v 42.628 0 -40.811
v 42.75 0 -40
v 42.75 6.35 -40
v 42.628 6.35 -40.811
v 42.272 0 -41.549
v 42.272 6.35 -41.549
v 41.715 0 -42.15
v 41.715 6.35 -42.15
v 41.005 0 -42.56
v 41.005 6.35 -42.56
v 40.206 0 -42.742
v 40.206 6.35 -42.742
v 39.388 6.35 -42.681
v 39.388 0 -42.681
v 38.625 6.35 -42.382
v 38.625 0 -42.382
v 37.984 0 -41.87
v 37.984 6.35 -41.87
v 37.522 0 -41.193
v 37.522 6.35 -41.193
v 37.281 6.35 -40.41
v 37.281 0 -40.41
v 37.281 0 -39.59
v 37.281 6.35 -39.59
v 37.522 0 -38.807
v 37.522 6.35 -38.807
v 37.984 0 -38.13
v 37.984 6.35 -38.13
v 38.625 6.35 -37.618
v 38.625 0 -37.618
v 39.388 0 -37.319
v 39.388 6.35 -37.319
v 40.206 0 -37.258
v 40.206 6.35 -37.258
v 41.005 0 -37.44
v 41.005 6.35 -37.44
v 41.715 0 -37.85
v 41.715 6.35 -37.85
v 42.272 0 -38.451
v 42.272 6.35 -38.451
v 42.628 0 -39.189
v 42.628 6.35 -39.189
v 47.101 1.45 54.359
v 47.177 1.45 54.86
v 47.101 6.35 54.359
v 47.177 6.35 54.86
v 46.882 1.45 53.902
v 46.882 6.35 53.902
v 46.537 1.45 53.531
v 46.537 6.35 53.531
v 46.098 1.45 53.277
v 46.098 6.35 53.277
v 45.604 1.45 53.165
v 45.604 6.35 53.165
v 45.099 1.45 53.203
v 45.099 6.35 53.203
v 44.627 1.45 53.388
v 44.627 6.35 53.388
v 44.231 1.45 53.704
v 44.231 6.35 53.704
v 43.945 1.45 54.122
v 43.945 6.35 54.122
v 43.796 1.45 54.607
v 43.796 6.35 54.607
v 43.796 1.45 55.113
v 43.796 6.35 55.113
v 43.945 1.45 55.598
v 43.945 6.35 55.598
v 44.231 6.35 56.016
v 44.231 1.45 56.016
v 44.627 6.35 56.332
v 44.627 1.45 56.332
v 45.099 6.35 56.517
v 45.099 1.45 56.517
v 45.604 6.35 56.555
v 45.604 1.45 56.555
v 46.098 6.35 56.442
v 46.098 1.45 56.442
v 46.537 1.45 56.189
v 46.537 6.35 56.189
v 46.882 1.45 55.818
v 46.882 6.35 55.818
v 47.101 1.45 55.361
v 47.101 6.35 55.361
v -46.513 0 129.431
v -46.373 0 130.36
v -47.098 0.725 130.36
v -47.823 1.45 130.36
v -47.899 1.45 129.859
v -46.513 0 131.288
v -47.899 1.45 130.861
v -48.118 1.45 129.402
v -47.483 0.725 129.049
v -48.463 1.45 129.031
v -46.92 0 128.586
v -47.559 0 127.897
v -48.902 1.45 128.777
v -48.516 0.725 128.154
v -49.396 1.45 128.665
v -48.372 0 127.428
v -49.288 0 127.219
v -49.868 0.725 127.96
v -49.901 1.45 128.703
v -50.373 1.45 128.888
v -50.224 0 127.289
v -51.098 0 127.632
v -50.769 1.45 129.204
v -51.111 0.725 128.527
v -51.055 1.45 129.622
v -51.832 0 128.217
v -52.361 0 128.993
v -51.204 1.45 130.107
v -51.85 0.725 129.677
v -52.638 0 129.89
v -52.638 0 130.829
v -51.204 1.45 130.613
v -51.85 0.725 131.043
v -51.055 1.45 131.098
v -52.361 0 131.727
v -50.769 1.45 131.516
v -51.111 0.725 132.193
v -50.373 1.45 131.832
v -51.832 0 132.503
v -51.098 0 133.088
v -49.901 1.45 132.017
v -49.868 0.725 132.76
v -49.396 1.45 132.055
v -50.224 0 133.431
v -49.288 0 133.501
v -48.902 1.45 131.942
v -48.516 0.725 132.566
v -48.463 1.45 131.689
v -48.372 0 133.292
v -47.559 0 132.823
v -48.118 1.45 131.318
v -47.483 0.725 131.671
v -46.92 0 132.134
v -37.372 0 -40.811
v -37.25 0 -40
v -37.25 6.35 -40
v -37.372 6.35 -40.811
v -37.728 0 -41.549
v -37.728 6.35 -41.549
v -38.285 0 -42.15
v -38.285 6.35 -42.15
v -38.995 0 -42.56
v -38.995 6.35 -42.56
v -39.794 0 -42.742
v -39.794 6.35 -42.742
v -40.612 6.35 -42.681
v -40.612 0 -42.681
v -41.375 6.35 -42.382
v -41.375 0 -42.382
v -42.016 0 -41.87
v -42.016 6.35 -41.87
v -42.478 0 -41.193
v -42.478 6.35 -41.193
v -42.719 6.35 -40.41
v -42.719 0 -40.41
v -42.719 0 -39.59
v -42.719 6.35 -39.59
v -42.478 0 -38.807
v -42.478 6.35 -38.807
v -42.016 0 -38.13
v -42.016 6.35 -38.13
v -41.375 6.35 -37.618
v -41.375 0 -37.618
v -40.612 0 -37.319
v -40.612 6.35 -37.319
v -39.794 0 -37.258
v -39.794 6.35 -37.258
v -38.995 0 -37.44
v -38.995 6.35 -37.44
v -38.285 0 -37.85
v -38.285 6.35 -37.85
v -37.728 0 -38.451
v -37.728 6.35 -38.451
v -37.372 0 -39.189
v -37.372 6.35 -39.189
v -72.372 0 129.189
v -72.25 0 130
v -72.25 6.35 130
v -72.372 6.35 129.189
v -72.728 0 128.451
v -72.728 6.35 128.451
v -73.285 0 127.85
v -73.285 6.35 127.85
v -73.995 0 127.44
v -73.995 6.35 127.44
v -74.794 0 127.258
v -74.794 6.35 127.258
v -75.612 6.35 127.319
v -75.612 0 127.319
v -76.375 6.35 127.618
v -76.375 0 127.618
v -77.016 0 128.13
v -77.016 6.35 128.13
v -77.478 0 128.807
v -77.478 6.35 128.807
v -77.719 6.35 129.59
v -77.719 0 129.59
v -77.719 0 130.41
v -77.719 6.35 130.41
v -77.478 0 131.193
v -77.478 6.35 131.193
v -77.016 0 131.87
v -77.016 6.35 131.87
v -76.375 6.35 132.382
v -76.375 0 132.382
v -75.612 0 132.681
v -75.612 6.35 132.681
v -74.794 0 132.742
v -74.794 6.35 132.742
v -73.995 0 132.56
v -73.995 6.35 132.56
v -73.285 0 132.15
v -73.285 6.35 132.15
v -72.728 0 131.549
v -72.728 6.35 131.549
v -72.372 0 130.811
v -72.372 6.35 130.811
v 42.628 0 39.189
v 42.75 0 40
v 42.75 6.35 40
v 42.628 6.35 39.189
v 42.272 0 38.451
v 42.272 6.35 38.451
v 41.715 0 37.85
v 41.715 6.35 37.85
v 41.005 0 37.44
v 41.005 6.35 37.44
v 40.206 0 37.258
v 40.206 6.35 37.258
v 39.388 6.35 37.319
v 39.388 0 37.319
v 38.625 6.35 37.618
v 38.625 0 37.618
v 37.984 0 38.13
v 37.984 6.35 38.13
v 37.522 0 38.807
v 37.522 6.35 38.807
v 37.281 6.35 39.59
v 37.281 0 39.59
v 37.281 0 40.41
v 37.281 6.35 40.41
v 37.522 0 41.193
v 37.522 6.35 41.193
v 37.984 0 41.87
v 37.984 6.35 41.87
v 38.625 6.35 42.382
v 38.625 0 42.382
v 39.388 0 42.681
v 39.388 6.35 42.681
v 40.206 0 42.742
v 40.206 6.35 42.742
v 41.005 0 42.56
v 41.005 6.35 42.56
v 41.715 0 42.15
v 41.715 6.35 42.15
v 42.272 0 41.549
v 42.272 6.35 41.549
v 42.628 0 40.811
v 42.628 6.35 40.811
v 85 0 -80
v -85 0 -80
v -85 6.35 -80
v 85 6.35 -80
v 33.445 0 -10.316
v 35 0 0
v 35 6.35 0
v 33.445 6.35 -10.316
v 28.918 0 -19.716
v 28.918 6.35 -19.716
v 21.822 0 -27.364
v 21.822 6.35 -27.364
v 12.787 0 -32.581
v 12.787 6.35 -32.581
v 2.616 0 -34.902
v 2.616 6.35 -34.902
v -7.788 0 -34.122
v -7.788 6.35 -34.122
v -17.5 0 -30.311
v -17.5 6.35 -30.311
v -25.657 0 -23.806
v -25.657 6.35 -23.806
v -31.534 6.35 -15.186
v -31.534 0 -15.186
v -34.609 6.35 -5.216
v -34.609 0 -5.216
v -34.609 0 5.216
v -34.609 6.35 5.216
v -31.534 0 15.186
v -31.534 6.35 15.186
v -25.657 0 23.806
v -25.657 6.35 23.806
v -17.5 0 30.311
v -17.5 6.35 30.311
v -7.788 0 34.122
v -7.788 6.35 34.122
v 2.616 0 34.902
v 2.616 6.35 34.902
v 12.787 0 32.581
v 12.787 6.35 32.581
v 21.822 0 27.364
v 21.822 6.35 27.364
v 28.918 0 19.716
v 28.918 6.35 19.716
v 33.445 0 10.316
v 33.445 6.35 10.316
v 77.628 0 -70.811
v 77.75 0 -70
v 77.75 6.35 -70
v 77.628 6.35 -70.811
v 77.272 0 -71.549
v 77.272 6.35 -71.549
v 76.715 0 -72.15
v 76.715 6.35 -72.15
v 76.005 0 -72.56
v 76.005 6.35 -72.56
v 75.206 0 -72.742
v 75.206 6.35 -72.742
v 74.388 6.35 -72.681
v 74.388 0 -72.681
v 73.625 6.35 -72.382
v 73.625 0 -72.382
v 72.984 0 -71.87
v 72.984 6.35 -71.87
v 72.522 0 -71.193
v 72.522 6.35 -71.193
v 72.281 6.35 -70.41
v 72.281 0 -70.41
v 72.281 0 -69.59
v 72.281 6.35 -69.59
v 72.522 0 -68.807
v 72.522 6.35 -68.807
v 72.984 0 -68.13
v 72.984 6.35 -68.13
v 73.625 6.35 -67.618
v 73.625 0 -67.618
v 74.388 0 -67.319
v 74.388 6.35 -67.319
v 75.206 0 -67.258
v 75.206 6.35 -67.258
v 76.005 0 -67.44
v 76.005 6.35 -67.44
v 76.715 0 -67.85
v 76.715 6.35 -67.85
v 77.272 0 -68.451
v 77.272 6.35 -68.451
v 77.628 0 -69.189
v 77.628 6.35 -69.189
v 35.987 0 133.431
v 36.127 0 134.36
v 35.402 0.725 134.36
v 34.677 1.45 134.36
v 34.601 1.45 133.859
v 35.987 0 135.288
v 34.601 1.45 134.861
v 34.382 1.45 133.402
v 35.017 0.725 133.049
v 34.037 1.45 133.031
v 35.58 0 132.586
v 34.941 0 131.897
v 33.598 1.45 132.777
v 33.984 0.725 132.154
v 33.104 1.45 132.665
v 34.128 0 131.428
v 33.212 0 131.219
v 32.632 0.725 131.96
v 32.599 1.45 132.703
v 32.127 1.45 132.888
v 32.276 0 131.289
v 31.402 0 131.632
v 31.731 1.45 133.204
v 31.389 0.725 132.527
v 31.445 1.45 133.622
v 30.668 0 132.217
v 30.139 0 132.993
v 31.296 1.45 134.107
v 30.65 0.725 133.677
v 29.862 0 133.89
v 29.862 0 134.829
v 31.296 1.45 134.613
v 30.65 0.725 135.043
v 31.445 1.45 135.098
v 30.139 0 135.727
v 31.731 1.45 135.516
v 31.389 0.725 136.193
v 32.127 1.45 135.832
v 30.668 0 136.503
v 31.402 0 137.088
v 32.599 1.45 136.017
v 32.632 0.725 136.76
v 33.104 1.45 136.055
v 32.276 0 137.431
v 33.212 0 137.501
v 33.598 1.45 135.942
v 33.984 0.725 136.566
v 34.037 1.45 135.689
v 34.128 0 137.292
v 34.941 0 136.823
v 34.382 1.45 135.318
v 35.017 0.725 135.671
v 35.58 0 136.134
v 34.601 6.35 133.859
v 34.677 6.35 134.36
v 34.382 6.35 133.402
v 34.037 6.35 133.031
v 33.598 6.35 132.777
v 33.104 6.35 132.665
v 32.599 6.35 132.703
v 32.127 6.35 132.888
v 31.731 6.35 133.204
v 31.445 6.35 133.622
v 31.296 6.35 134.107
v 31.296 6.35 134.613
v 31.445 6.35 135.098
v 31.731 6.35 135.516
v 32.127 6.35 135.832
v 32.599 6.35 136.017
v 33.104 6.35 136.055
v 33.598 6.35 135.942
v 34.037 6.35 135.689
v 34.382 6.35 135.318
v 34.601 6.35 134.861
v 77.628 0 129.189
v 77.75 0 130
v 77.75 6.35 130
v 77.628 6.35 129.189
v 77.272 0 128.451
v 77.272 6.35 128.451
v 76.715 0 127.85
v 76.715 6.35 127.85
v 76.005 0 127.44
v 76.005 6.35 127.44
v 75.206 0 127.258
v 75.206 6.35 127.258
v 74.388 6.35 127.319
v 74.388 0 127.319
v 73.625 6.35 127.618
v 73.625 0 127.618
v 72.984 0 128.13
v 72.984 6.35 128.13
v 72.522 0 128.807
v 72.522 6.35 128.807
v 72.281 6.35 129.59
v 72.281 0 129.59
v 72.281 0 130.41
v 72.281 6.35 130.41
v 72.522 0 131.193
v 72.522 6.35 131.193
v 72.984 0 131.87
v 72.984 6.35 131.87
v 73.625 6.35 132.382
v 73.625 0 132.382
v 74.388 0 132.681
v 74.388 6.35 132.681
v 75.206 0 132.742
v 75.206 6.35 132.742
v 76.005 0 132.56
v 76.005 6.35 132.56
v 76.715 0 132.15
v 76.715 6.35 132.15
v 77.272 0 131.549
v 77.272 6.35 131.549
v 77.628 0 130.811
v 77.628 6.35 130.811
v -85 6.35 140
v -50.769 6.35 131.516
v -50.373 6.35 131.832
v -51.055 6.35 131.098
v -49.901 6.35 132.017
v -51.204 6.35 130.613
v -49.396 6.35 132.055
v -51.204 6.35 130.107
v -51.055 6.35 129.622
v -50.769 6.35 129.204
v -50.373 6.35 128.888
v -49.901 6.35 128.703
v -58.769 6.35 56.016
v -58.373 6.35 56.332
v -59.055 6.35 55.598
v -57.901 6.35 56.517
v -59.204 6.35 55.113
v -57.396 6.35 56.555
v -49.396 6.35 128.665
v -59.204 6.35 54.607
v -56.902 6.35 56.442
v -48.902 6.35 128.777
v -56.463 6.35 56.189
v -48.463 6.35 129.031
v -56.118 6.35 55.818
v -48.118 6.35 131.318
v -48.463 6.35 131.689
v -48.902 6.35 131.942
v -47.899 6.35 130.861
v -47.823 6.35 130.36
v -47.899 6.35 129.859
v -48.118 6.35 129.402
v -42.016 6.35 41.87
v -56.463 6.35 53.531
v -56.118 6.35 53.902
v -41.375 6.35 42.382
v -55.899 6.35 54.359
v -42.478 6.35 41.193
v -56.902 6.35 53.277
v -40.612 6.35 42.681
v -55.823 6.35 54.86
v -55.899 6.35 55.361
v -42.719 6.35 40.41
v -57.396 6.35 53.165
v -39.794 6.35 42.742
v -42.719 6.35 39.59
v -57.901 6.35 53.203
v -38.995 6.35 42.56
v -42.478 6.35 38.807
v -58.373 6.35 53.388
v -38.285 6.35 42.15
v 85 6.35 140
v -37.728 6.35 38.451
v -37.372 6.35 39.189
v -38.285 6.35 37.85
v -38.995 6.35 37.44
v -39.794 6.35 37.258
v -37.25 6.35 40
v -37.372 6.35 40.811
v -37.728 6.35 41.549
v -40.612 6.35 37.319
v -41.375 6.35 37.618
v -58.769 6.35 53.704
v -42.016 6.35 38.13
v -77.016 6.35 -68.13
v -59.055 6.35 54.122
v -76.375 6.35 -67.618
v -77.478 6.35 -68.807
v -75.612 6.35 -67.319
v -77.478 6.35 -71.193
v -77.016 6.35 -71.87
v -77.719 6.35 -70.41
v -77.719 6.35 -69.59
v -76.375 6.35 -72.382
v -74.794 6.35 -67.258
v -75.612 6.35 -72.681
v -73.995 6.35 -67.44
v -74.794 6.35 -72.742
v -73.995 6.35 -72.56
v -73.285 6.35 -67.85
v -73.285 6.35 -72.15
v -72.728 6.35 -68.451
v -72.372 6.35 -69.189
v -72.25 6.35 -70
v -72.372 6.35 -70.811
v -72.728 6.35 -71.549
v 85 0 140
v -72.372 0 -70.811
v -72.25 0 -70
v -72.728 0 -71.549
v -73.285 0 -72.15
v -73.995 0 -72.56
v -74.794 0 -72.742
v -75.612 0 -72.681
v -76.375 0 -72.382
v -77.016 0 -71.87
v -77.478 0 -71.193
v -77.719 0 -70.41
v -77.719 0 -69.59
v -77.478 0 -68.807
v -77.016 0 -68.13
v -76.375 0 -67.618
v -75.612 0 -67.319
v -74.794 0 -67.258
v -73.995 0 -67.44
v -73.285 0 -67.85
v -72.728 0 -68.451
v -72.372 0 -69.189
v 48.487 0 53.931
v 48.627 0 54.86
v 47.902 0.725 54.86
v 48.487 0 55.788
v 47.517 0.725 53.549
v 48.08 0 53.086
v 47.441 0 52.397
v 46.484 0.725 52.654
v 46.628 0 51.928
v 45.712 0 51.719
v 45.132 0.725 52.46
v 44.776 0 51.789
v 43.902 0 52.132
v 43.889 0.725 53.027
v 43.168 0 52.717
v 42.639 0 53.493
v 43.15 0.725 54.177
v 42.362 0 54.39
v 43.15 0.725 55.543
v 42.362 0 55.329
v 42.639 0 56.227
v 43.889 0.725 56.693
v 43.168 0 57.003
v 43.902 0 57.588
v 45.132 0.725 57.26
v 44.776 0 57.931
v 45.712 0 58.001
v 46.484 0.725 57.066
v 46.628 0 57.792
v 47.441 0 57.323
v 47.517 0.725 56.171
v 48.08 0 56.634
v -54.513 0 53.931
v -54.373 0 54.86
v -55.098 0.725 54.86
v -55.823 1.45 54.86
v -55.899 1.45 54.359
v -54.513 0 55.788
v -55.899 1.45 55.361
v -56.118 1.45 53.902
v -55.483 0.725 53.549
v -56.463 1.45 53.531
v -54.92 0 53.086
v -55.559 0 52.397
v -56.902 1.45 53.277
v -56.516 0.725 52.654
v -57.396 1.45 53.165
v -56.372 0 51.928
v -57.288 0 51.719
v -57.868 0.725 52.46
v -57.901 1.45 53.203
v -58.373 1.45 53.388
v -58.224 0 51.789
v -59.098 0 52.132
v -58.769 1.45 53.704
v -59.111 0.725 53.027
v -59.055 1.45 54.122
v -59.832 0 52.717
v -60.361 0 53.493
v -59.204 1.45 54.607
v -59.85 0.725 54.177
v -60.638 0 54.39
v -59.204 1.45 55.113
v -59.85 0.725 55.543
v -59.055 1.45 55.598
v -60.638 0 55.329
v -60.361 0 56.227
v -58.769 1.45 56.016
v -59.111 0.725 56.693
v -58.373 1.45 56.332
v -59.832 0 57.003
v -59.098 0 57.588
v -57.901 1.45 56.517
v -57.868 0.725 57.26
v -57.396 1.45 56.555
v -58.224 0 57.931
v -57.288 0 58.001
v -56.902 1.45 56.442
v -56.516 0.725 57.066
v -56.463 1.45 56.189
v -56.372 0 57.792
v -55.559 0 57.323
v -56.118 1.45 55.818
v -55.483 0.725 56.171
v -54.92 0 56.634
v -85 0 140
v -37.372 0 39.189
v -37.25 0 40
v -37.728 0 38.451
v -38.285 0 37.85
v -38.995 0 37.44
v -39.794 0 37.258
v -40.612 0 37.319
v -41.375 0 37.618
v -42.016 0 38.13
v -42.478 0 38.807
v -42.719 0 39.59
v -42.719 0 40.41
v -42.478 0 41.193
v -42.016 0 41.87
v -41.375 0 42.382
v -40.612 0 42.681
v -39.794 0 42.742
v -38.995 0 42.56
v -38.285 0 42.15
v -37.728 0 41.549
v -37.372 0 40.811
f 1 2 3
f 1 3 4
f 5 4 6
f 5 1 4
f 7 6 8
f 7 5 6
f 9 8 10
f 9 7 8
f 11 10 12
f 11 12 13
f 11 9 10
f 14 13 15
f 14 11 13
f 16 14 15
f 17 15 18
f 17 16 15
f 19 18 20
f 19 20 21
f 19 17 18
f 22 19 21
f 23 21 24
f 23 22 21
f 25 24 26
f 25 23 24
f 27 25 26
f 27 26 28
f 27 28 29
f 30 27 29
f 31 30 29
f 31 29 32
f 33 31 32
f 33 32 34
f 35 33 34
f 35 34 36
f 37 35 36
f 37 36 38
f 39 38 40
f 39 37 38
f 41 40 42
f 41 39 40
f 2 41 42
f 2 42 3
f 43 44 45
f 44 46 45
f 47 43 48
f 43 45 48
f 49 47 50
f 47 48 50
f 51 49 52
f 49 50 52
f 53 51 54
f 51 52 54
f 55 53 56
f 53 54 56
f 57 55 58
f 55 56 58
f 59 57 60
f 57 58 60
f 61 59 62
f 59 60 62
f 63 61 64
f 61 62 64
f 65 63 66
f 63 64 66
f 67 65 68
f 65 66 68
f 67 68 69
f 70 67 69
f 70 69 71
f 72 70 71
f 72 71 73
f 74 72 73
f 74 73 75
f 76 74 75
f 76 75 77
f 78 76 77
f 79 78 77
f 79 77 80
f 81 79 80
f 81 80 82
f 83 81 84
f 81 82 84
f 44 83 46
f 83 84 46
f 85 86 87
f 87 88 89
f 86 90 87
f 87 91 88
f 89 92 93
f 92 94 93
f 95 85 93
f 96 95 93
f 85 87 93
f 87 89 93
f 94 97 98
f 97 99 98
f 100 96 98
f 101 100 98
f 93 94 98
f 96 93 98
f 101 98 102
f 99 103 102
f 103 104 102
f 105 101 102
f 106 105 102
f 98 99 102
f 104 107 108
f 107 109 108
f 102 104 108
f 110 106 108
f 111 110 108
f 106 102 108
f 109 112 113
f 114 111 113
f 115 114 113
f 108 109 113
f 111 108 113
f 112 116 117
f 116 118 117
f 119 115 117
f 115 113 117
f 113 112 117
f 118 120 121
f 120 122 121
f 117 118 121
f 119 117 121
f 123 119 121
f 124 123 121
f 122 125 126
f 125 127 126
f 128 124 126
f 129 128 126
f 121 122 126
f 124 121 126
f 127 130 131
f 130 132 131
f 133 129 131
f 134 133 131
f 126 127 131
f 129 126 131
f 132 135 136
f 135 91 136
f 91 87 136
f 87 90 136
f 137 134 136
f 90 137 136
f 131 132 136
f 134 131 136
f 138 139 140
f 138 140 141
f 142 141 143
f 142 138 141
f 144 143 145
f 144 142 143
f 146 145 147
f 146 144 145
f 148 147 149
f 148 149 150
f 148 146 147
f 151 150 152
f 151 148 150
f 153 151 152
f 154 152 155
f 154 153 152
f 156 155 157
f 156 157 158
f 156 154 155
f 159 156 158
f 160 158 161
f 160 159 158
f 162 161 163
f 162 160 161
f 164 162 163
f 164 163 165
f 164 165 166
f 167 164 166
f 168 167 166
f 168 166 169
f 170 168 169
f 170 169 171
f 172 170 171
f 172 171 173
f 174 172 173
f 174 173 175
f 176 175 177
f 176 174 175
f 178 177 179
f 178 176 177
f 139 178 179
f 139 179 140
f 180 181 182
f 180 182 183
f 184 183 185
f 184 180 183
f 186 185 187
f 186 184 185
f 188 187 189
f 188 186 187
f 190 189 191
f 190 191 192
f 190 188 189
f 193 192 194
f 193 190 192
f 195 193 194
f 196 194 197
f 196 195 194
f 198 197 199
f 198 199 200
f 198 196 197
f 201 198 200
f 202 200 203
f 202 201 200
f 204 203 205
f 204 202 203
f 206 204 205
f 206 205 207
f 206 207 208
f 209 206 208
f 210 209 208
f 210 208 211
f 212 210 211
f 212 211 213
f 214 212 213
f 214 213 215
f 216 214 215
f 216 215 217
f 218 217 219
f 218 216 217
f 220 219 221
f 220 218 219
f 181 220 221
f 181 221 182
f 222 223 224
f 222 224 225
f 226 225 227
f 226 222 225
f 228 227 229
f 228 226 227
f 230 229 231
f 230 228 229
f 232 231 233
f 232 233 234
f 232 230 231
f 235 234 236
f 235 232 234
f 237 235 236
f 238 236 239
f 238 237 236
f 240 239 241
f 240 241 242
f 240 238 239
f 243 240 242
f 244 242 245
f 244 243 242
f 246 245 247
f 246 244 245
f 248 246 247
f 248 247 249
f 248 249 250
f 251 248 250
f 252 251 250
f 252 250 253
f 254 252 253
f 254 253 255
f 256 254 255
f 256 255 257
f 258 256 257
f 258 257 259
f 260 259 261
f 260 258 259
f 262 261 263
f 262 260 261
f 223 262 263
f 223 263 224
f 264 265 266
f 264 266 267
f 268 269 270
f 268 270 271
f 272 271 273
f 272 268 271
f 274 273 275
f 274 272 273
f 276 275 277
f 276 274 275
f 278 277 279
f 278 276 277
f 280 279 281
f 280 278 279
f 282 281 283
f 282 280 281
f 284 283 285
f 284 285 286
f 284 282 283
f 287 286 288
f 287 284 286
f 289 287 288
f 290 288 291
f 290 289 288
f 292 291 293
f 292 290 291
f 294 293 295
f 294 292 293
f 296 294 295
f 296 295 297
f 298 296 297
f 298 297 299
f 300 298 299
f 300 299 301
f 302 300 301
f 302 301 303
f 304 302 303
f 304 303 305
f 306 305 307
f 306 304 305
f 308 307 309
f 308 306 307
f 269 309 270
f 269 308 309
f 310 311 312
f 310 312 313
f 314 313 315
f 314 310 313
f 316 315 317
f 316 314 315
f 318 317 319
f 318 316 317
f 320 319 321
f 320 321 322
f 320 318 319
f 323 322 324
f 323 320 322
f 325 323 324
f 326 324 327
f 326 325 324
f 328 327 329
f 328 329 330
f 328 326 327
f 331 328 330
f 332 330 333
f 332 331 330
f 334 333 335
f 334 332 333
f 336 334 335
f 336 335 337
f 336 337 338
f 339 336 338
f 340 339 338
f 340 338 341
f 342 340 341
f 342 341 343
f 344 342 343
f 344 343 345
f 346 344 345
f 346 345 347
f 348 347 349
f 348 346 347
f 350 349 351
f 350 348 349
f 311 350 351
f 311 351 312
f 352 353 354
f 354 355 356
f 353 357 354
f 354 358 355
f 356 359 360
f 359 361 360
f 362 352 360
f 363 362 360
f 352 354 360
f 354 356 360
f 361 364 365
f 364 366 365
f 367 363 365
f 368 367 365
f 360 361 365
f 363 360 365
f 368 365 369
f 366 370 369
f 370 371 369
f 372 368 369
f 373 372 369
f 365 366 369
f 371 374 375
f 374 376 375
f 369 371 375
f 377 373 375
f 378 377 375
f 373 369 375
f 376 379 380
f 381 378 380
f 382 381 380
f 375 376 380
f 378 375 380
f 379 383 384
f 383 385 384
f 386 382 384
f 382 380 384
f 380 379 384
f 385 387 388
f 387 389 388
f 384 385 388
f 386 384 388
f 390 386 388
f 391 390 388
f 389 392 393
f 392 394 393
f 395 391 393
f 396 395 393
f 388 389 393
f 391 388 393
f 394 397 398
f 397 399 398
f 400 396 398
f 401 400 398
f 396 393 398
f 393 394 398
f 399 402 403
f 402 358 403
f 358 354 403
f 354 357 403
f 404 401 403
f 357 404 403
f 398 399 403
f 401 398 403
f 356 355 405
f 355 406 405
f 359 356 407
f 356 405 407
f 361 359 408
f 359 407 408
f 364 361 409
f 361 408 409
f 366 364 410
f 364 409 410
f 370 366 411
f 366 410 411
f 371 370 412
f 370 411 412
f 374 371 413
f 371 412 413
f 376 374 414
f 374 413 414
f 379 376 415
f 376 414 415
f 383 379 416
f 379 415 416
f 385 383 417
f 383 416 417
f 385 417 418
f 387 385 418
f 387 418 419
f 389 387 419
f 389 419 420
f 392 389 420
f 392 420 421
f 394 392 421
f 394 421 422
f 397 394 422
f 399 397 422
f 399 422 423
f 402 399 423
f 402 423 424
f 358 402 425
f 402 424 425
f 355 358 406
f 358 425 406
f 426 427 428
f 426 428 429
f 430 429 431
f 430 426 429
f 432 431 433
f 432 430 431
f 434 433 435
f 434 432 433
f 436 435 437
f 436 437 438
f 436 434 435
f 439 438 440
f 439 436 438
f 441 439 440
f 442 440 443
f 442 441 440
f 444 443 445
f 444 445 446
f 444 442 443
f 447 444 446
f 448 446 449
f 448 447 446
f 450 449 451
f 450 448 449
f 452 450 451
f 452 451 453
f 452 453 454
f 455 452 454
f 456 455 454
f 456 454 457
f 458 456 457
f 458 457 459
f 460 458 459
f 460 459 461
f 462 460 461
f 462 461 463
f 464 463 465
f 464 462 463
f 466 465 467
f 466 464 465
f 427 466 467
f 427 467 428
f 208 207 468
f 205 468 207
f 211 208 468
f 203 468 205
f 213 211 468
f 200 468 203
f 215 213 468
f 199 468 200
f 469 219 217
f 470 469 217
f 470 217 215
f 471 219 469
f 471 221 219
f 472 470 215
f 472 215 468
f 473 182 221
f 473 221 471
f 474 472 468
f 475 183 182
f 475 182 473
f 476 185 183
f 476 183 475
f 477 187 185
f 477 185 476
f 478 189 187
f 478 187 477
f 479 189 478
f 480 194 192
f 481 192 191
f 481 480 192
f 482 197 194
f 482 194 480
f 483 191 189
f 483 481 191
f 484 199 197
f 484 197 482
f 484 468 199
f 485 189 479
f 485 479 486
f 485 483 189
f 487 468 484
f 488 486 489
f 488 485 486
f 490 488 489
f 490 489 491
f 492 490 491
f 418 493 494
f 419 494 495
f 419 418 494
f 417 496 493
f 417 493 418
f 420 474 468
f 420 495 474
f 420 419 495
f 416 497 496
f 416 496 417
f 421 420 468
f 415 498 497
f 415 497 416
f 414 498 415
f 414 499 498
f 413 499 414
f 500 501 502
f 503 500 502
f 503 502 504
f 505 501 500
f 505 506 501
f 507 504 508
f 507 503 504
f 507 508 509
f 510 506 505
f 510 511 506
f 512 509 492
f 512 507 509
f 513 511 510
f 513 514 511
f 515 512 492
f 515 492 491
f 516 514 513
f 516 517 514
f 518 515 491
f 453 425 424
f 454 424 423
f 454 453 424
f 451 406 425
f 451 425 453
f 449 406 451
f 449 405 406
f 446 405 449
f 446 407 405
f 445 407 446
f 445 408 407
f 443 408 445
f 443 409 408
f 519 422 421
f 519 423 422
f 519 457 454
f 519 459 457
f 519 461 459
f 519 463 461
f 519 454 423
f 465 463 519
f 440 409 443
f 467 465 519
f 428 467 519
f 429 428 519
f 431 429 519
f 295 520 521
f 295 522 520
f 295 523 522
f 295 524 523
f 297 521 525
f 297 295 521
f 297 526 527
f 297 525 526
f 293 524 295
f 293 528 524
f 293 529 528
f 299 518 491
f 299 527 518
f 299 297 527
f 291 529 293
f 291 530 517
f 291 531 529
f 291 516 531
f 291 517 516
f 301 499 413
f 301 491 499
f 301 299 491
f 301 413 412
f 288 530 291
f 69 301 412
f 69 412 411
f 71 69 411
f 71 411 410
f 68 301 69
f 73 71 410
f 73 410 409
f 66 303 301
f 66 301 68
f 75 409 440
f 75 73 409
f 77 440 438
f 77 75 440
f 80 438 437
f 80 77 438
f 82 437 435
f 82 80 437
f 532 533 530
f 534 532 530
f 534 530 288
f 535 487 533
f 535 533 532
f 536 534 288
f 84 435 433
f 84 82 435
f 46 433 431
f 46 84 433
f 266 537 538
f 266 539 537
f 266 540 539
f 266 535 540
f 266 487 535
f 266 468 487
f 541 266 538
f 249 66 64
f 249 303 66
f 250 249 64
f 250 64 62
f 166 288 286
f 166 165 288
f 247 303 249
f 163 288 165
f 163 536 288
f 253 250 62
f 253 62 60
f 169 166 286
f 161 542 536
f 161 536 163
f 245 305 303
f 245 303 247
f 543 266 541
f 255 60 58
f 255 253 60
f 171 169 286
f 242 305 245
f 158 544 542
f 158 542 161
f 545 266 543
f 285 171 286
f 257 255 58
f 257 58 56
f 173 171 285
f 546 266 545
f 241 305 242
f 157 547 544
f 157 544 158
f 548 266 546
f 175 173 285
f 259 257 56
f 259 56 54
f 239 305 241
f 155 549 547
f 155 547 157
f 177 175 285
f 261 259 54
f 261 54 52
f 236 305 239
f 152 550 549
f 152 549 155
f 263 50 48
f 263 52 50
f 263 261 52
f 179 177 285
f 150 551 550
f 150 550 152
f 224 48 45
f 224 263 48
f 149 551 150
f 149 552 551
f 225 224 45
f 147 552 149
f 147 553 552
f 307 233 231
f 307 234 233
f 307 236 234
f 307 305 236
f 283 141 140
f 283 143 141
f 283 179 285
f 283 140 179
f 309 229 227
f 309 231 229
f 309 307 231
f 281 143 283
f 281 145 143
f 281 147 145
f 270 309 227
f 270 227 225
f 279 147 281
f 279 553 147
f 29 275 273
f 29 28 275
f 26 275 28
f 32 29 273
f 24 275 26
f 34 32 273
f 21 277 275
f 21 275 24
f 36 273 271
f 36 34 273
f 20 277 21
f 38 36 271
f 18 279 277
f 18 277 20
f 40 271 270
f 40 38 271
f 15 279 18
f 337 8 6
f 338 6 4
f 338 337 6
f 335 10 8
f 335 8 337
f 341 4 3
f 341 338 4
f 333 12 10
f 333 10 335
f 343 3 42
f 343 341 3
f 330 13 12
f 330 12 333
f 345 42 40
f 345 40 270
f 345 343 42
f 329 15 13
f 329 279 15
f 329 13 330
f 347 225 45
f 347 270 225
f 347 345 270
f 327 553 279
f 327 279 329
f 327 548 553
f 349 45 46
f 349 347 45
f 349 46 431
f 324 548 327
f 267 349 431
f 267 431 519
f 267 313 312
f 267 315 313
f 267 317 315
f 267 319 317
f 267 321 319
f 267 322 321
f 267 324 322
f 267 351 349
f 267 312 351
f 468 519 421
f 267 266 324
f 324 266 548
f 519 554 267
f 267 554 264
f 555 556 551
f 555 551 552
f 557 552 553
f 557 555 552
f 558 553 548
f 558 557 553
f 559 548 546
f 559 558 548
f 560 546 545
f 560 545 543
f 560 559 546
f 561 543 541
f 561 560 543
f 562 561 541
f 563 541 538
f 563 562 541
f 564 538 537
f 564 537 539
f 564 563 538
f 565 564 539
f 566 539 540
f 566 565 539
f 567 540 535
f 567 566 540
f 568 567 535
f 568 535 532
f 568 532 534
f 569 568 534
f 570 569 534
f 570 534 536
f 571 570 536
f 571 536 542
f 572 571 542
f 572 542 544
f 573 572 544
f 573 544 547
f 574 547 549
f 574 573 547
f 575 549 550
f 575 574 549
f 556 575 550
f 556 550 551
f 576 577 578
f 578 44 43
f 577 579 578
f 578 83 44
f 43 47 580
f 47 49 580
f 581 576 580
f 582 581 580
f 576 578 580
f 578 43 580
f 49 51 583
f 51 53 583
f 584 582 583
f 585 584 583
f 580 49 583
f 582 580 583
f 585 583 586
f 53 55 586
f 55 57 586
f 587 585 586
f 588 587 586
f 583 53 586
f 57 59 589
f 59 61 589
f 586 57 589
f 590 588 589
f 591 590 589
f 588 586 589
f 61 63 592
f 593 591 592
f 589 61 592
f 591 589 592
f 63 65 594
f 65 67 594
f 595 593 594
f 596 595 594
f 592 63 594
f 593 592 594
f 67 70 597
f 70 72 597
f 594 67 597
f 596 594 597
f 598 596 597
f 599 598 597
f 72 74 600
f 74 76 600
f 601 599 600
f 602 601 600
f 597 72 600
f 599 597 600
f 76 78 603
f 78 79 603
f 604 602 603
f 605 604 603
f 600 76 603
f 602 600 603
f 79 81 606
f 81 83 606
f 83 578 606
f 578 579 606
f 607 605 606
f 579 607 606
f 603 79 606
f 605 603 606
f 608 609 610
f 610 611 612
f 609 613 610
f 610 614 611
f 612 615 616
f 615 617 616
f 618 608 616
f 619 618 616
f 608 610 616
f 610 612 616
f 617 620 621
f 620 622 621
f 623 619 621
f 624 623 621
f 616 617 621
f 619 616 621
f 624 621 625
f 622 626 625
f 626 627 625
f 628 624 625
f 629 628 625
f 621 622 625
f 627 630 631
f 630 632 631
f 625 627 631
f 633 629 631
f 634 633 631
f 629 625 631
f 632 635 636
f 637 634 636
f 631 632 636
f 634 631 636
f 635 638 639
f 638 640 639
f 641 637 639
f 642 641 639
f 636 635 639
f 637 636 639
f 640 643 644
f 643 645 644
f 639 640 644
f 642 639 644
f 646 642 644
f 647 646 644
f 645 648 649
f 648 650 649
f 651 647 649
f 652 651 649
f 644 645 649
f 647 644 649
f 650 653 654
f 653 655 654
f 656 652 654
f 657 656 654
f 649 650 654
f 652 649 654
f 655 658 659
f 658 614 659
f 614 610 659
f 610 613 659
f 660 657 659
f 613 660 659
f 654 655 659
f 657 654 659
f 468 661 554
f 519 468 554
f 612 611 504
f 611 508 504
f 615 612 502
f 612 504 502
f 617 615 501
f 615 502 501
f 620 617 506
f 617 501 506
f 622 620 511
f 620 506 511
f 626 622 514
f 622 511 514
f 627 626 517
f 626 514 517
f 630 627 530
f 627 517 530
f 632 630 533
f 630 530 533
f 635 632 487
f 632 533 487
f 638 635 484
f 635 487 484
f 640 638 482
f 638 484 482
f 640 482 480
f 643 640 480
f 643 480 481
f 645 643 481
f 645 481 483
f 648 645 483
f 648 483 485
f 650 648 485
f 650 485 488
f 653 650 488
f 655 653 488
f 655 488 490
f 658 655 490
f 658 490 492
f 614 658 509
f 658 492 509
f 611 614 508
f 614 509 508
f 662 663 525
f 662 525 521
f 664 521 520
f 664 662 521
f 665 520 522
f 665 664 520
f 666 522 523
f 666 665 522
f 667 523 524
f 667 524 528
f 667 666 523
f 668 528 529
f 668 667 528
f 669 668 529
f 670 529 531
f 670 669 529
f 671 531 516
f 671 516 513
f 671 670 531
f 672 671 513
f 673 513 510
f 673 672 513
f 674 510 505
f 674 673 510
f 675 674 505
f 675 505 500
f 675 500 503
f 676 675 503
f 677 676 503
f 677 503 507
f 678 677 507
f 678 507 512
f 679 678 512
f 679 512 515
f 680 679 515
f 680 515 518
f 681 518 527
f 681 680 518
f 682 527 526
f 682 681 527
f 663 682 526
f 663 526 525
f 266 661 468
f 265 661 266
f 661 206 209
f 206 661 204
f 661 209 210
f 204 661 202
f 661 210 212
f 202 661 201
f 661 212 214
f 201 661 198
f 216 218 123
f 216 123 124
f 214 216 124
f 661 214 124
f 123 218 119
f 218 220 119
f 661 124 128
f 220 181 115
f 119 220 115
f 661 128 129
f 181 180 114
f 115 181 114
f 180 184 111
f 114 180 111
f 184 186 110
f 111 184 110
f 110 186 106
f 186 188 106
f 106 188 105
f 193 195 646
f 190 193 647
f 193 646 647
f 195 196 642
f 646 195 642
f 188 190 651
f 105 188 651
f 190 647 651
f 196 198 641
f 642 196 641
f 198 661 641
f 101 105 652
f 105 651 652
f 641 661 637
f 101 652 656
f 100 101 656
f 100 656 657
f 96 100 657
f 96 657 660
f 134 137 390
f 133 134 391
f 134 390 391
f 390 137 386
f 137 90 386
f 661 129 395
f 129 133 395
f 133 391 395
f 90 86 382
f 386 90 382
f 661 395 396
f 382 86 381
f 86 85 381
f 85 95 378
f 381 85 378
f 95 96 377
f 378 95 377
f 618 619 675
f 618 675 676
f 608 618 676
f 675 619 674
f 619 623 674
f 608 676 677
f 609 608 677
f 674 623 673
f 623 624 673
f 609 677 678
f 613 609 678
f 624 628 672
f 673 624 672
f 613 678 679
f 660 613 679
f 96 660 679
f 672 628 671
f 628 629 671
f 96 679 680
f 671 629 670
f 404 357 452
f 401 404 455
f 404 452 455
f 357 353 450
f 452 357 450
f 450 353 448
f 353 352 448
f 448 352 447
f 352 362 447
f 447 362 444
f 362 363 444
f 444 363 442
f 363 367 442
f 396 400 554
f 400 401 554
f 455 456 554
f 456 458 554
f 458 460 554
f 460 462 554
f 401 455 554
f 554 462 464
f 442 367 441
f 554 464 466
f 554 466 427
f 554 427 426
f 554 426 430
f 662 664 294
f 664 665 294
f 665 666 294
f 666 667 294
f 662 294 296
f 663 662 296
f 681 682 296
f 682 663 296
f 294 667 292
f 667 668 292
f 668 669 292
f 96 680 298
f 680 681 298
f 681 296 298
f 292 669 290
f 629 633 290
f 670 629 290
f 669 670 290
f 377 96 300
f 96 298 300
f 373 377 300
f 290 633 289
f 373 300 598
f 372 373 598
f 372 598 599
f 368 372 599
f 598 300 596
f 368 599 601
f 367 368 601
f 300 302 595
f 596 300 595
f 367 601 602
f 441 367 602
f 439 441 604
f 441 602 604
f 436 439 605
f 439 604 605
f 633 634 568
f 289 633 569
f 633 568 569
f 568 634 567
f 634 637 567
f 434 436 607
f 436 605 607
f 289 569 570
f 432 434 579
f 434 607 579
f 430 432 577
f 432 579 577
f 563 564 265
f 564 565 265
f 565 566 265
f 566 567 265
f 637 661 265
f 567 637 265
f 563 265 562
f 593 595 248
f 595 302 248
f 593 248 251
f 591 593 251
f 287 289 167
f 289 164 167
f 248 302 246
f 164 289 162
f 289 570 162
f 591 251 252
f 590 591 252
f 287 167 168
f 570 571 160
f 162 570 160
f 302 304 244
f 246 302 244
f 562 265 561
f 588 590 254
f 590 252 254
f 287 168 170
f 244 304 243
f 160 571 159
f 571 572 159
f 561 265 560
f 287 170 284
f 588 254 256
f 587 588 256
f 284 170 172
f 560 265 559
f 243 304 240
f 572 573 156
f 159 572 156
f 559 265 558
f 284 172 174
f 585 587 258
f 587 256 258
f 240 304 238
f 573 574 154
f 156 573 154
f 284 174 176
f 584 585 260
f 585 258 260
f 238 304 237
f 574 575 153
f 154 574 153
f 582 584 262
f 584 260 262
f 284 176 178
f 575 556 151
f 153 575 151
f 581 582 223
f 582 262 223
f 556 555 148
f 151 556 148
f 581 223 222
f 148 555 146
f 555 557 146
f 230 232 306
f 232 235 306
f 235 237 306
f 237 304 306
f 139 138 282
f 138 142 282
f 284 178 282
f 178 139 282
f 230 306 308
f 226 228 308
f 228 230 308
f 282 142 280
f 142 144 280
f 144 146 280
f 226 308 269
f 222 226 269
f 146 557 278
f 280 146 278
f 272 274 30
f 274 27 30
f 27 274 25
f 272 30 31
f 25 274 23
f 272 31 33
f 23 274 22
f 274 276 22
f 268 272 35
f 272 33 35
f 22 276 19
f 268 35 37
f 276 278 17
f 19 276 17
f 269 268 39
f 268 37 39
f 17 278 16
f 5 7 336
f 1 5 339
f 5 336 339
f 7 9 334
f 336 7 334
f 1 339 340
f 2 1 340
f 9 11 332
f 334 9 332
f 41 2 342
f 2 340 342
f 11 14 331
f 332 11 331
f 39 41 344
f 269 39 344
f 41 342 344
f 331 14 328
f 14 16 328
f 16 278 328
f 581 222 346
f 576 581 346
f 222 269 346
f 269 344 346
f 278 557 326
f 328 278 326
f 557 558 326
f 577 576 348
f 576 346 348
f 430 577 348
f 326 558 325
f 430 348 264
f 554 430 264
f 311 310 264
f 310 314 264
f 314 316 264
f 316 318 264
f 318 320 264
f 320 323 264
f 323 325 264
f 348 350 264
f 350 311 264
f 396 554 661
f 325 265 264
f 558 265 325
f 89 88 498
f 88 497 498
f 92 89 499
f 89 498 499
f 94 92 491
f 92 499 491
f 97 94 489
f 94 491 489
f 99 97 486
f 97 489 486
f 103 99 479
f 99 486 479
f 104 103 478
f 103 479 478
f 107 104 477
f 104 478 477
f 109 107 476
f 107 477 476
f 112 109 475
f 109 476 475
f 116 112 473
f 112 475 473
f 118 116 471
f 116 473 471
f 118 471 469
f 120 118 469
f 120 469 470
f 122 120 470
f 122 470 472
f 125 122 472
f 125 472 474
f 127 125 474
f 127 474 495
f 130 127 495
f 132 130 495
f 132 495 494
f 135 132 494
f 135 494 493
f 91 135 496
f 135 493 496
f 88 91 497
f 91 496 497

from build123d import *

# Parameters (mm, degrees)
SKETCH2_W                                       = 170
SKETCH2_H                                       = 220
SKETCH2_R                                       = 35
SKETCH2_R_2                                     = 2.75
BOSS_EXTRUDE1_DEPTH                             = 6.35
CSK_FOR_M3_FLAT_HEAD_MACHINE_SCREW2_D           = 3.4
CSK_FOR_M3_FLAT_HEAD_MACHINE_SCREW2_CSINK_D     = 6.3
CSK_FOR_M3_FLAT_HEAD_MACHINE_SCREW2_CSINK_ANGLE = 90


with BuildPart() as part:
    # Sketch2 → Boss-Extrude1 (new body)
    with BuildSketch(Plane(origin=(0, 0, 0), x_dir=(1, 0, 0), z_dir=(0, 1, 0))):
        with Locations((0, -30)):
            Rectangle(SKETCH2_W, SKETCH2_H)
        Circle(SKETCH2_R, mode=Mode.SUBTRACT)
        with Locations((-40, 40)):
            Circle(SKETCH2_R_2, mode=Mode.SUBTRACT)
        with Locations((40, 40)):
            Circle(SKETCH2_R_2, mode=Mode.SUBTRACT)
        with Locations((40, -40)):
            Circle(SKETCH2_R_2, mode=Mode.SUBTRACT)
        with Locations((-40, -40)):
            Circle(SKETCH2_R_2, mode=Mode.SUBTRACT)
        with Locations((-75, 70)):
            Circle(SKETCH2_R_2, mode=Mode.SUBTRACT)
        with Locations((-75, -130)):
            Circle(SKETCH2_R_2, mode=Mode.SUBTRACT)
        with Locations((75, 70)):
            Circle(SKETCH2_R_2, mode=Mode.SUBTRACT)
        with Locations((75, -130)):
            Circle(SKETCH2_R_2, mode=Mode.SUBTRACT)
    extrude(amount=BOSS_EXTRUDE1_DEPTH)

    # CSK for M3 Flat Head Machine Screw2 (through all)
    with Locations(Plane(origin=(0, 0, 0), x_dir=(-1, 0, 0), z_dir=(0, -1, 0))):
        with Locations((57.523089764, -54.859977456), (-45.476910236, -54.859977456), (-32.976910236, -134.359977456), (49.523089764, -130.359977456)):
            CounterSinkHole(CSK_FOR_M3_FLAT_HEAD_MACHINE_SCREW2_D / 2, CSK_FOR_M3_FLAT_HEAD_MACHINE_SCREW2_CSINK_D / 2, counter_sink_angle=CSK_FOR_M3_FLAT_HEAD_MACHINE_SCREW2_CSINK_ANGLE)


solid = part.part
